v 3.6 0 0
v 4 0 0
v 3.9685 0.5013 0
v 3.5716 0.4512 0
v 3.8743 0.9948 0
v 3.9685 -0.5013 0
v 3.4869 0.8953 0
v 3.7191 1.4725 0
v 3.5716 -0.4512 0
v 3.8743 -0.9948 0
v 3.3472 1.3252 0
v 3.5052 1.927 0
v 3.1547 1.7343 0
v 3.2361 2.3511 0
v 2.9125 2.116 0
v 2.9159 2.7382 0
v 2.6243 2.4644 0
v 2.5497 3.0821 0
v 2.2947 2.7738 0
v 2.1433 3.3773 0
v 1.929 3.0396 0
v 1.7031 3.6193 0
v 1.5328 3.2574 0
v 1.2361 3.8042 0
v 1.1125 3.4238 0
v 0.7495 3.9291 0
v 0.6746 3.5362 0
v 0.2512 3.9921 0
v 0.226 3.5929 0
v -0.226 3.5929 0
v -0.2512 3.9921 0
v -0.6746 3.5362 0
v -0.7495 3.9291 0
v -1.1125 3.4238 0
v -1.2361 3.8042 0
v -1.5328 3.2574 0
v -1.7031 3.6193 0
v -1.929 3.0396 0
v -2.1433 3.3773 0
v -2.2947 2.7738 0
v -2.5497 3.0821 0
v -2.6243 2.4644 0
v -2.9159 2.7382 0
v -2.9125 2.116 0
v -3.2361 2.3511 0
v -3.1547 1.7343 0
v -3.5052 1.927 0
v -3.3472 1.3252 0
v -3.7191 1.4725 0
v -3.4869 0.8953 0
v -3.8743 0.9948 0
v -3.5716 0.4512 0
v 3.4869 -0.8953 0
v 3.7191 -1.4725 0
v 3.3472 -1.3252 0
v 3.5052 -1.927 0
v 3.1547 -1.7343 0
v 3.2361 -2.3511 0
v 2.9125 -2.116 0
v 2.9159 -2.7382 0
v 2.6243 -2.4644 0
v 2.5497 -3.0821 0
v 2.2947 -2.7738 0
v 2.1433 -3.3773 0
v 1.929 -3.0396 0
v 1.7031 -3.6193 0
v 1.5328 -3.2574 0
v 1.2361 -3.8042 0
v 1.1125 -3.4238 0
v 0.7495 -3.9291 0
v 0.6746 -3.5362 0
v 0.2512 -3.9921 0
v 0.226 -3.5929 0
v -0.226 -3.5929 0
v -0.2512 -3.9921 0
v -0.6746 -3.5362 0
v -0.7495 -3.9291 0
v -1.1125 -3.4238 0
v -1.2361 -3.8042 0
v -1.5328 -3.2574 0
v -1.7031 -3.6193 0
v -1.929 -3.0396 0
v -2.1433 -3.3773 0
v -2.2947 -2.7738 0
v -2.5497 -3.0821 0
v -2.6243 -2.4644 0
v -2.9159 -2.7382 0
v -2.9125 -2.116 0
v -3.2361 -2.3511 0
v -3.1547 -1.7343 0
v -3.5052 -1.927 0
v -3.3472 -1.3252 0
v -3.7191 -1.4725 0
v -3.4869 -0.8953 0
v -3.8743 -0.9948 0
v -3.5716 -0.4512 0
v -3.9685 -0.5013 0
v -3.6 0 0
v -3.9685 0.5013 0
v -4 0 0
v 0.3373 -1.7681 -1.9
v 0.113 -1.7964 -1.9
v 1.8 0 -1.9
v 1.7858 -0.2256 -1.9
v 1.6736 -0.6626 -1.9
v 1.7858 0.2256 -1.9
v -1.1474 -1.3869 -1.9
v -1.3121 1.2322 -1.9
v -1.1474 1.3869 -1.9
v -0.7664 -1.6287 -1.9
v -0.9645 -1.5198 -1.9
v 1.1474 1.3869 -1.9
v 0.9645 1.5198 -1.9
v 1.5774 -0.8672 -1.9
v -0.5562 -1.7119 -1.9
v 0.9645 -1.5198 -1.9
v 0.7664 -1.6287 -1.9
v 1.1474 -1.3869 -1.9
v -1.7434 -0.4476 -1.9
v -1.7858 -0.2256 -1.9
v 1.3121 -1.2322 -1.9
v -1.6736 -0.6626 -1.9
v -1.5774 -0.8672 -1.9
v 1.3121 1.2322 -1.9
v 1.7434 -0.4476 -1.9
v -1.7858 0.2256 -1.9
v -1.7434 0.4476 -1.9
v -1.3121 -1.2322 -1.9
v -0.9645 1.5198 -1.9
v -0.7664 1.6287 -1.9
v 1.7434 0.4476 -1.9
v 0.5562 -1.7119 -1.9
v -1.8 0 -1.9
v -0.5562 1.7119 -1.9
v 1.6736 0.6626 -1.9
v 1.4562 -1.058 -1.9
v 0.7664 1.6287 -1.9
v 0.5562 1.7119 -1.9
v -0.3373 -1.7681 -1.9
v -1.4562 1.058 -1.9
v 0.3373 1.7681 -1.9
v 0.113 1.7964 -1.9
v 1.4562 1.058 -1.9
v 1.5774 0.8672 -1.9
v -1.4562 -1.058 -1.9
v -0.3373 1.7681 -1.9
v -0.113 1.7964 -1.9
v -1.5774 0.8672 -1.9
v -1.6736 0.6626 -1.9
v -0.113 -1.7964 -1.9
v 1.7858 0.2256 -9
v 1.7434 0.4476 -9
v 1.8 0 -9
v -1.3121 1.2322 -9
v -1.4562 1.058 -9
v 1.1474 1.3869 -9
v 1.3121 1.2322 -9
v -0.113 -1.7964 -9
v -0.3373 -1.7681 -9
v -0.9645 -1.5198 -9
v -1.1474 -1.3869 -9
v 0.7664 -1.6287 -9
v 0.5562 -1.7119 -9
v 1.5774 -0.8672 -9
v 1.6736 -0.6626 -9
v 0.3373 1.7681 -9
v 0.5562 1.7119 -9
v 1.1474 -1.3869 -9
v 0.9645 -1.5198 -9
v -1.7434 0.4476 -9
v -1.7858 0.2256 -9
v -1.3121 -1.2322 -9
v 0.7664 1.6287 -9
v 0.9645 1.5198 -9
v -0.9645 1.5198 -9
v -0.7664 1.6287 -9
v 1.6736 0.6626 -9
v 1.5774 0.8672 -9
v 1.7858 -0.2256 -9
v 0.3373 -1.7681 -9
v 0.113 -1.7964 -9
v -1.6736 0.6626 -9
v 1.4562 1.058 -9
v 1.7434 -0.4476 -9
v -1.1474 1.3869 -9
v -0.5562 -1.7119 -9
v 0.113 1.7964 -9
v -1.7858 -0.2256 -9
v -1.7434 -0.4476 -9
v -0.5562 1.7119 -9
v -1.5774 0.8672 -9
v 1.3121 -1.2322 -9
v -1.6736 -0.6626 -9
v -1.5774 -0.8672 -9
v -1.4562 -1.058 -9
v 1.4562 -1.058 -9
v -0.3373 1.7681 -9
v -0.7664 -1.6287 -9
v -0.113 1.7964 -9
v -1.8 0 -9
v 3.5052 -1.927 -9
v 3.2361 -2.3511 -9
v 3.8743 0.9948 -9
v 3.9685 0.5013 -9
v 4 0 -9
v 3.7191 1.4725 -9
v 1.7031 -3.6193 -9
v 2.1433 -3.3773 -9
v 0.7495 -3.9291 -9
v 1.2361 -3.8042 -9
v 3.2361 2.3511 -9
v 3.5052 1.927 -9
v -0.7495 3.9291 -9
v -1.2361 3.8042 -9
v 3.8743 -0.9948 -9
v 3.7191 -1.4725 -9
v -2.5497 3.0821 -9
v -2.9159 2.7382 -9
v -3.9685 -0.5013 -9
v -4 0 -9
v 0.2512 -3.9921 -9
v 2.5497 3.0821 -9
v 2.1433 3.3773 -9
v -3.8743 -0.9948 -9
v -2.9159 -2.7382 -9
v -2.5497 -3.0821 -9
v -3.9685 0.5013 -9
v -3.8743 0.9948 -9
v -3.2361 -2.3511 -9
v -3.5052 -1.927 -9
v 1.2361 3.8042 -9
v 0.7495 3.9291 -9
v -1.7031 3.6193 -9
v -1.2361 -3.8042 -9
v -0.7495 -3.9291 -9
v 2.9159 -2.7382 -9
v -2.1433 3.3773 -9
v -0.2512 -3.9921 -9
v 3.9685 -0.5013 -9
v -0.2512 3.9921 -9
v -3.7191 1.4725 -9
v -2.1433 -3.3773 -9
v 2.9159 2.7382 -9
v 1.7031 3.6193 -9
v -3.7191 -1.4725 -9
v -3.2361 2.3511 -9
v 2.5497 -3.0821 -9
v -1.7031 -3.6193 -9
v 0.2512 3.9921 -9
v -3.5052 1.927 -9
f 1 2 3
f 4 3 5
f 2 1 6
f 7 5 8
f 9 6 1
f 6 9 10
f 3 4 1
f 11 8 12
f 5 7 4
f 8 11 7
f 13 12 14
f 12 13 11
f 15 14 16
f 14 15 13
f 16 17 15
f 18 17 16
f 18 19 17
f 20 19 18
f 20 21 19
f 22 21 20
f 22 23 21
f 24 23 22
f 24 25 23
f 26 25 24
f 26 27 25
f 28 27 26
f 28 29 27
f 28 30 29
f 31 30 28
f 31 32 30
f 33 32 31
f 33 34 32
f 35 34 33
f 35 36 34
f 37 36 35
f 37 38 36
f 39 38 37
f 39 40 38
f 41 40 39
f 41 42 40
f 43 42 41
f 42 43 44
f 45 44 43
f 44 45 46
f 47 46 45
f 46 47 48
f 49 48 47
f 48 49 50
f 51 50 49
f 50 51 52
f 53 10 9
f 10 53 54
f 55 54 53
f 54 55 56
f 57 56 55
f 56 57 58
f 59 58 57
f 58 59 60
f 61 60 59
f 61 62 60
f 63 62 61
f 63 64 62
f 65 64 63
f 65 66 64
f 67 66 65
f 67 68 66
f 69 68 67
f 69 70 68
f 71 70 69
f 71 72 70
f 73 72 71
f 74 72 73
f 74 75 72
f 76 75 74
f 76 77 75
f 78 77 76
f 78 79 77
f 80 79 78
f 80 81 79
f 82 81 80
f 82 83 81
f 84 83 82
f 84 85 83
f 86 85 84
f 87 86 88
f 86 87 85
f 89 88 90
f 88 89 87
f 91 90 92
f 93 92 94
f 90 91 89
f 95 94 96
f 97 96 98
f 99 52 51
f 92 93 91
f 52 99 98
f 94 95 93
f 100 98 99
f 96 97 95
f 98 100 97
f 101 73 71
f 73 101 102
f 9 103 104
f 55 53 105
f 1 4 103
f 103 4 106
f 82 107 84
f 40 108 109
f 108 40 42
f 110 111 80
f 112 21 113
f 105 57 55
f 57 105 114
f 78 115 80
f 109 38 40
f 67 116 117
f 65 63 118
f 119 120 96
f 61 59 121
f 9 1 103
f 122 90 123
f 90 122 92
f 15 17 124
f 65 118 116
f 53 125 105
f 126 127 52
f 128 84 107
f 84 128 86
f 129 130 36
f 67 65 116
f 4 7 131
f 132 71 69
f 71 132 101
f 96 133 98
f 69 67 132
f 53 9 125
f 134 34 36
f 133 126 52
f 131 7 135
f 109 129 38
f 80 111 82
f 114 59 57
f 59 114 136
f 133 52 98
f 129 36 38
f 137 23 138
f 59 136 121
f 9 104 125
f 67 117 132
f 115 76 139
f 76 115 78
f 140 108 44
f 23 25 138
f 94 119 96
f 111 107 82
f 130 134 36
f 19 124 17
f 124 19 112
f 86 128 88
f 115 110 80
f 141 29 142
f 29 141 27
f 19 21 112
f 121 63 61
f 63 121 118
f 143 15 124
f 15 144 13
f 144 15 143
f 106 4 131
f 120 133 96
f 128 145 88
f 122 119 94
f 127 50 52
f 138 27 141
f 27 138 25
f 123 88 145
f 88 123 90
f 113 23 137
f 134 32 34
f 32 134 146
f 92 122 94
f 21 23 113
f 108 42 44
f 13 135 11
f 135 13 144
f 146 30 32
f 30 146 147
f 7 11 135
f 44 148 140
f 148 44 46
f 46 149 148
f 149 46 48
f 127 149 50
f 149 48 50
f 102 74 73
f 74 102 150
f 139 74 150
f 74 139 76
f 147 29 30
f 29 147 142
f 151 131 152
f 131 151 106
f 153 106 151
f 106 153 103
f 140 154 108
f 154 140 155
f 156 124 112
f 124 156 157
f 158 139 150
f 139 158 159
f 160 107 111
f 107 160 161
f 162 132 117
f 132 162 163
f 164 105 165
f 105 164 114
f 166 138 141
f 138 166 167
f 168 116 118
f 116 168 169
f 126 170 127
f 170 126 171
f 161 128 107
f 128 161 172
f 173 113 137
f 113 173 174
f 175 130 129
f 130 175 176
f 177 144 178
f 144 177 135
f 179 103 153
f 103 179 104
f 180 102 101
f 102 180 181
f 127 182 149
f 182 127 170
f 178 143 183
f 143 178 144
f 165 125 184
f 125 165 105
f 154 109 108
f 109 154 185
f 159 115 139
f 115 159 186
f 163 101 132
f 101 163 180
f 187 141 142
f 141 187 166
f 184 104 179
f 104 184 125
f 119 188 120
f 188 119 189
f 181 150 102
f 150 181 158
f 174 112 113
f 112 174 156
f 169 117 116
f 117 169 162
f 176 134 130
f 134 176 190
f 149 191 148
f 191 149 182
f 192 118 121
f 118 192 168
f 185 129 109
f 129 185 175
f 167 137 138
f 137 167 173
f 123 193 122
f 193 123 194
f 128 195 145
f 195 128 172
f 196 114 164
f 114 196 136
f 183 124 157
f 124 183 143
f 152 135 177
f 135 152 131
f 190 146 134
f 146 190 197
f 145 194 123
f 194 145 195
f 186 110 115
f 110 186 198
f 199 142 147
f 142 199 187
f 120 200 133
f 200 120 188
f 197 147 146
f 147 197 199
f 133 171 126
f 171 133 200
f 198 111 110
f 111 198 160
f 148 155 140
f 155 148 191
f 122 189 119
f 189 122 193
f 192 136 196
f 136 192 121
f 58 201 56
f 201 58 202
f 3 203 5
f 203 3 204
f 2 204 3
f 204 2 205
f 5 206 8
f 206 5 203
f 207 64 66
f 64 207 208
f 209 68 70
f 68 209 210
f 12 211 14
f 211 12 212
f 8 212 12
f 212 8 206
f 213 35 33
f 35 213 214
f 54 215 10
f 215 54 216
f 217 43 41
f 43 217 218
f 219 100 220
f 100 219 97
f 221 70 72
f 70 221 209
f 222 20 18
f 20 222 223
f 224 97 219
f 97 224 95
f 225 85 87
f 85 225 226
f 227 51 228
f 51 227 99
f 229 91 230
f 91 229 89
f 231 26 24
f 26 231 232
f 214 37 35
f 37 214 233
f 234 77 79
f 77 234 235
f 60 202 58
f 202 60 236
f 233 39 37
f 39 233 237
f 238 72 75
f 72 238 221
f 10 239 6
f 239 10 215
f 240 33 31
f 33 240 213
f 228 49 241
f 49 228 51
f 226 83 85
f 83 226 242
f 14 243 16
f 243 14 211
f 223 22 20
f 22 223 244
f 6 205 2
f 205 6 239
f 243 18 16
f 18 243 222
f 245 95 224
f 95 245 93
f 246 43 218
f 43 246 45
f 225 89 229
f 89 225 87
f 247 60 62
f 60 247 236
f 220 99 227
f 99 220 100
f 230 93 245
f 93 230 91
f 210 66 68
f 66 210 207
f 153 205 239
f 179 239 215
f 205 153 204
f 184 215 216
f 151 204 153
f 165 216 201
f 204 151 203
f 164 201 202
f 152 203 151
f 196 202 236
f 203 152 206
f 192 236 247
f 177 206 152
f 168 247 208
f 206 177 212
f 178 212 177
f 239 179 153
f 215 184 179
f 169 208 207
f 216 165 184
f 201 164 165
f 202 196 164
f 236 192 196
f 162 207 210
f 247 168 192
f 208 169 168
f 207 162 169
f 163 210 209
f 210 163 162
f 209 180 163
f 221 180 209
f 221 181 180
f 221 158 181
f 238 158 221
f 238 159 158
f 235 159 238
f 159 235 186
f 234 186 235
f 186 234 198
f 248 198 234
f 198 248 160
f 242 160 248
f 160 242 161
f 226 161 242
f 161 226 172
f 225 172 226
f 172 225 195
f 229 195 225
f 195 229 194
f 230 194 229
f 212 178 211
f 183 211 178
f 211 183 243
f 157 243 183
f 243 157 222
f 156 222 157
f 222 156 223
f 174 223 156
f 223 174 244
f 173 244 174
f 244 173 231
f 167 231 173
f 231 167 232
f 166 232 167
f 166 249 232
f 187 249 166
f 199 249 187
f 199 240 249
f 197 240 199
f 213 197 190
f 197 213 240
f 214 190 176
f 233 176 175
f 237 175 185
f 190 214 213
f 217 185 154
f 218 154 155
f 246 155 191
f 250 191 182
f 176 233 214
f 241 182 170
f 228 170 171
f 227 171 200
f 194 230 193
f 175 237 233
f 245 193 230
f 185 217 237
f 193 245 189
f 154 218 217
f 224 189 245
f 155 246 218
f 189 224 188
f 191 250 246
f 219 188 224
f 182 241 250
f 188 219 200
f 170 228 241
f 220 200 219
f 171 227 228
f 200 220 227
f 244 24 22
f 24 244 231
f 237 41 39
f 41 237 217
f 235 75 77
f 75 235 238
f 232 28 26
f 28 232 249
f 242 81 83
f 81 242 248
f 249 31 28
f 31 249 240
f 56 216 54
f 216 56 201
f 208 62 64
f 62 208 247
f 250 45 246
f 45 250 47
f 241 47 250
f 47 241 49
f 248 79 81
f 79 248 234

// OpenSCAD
$fn = 50;

difference() {
	union() {
		translate(v = [0, 0, -9.0]) {
			cylinder(h = 12, r = 4.0);
		}
	}
	union() {
		translate(v = [0, 0, 0]) {
			rotate(a = [0, 0, 0]) {
				difference() {
					union() {
						translate(v = [0, 0, -12.0]) {
							cylinder(h = 12, r = 1.5);
						}
						translate(v = [0, 0, -1.9]) {
							cylinder(h = 1.9, r1 = 1.8, r2 = 3.6);
						}
						translate(v = [0, 0, -12.0]) {
							cylinder(h = 12, r = 1.8);
						}
						translate(v = [0, 0, -12.0]) {
							cylinder(h = 12, r = 1.5);
						}
					}
					union();
				}
			}
		}
		#cylinder(h = 3, r = 5.0);
	}
}
